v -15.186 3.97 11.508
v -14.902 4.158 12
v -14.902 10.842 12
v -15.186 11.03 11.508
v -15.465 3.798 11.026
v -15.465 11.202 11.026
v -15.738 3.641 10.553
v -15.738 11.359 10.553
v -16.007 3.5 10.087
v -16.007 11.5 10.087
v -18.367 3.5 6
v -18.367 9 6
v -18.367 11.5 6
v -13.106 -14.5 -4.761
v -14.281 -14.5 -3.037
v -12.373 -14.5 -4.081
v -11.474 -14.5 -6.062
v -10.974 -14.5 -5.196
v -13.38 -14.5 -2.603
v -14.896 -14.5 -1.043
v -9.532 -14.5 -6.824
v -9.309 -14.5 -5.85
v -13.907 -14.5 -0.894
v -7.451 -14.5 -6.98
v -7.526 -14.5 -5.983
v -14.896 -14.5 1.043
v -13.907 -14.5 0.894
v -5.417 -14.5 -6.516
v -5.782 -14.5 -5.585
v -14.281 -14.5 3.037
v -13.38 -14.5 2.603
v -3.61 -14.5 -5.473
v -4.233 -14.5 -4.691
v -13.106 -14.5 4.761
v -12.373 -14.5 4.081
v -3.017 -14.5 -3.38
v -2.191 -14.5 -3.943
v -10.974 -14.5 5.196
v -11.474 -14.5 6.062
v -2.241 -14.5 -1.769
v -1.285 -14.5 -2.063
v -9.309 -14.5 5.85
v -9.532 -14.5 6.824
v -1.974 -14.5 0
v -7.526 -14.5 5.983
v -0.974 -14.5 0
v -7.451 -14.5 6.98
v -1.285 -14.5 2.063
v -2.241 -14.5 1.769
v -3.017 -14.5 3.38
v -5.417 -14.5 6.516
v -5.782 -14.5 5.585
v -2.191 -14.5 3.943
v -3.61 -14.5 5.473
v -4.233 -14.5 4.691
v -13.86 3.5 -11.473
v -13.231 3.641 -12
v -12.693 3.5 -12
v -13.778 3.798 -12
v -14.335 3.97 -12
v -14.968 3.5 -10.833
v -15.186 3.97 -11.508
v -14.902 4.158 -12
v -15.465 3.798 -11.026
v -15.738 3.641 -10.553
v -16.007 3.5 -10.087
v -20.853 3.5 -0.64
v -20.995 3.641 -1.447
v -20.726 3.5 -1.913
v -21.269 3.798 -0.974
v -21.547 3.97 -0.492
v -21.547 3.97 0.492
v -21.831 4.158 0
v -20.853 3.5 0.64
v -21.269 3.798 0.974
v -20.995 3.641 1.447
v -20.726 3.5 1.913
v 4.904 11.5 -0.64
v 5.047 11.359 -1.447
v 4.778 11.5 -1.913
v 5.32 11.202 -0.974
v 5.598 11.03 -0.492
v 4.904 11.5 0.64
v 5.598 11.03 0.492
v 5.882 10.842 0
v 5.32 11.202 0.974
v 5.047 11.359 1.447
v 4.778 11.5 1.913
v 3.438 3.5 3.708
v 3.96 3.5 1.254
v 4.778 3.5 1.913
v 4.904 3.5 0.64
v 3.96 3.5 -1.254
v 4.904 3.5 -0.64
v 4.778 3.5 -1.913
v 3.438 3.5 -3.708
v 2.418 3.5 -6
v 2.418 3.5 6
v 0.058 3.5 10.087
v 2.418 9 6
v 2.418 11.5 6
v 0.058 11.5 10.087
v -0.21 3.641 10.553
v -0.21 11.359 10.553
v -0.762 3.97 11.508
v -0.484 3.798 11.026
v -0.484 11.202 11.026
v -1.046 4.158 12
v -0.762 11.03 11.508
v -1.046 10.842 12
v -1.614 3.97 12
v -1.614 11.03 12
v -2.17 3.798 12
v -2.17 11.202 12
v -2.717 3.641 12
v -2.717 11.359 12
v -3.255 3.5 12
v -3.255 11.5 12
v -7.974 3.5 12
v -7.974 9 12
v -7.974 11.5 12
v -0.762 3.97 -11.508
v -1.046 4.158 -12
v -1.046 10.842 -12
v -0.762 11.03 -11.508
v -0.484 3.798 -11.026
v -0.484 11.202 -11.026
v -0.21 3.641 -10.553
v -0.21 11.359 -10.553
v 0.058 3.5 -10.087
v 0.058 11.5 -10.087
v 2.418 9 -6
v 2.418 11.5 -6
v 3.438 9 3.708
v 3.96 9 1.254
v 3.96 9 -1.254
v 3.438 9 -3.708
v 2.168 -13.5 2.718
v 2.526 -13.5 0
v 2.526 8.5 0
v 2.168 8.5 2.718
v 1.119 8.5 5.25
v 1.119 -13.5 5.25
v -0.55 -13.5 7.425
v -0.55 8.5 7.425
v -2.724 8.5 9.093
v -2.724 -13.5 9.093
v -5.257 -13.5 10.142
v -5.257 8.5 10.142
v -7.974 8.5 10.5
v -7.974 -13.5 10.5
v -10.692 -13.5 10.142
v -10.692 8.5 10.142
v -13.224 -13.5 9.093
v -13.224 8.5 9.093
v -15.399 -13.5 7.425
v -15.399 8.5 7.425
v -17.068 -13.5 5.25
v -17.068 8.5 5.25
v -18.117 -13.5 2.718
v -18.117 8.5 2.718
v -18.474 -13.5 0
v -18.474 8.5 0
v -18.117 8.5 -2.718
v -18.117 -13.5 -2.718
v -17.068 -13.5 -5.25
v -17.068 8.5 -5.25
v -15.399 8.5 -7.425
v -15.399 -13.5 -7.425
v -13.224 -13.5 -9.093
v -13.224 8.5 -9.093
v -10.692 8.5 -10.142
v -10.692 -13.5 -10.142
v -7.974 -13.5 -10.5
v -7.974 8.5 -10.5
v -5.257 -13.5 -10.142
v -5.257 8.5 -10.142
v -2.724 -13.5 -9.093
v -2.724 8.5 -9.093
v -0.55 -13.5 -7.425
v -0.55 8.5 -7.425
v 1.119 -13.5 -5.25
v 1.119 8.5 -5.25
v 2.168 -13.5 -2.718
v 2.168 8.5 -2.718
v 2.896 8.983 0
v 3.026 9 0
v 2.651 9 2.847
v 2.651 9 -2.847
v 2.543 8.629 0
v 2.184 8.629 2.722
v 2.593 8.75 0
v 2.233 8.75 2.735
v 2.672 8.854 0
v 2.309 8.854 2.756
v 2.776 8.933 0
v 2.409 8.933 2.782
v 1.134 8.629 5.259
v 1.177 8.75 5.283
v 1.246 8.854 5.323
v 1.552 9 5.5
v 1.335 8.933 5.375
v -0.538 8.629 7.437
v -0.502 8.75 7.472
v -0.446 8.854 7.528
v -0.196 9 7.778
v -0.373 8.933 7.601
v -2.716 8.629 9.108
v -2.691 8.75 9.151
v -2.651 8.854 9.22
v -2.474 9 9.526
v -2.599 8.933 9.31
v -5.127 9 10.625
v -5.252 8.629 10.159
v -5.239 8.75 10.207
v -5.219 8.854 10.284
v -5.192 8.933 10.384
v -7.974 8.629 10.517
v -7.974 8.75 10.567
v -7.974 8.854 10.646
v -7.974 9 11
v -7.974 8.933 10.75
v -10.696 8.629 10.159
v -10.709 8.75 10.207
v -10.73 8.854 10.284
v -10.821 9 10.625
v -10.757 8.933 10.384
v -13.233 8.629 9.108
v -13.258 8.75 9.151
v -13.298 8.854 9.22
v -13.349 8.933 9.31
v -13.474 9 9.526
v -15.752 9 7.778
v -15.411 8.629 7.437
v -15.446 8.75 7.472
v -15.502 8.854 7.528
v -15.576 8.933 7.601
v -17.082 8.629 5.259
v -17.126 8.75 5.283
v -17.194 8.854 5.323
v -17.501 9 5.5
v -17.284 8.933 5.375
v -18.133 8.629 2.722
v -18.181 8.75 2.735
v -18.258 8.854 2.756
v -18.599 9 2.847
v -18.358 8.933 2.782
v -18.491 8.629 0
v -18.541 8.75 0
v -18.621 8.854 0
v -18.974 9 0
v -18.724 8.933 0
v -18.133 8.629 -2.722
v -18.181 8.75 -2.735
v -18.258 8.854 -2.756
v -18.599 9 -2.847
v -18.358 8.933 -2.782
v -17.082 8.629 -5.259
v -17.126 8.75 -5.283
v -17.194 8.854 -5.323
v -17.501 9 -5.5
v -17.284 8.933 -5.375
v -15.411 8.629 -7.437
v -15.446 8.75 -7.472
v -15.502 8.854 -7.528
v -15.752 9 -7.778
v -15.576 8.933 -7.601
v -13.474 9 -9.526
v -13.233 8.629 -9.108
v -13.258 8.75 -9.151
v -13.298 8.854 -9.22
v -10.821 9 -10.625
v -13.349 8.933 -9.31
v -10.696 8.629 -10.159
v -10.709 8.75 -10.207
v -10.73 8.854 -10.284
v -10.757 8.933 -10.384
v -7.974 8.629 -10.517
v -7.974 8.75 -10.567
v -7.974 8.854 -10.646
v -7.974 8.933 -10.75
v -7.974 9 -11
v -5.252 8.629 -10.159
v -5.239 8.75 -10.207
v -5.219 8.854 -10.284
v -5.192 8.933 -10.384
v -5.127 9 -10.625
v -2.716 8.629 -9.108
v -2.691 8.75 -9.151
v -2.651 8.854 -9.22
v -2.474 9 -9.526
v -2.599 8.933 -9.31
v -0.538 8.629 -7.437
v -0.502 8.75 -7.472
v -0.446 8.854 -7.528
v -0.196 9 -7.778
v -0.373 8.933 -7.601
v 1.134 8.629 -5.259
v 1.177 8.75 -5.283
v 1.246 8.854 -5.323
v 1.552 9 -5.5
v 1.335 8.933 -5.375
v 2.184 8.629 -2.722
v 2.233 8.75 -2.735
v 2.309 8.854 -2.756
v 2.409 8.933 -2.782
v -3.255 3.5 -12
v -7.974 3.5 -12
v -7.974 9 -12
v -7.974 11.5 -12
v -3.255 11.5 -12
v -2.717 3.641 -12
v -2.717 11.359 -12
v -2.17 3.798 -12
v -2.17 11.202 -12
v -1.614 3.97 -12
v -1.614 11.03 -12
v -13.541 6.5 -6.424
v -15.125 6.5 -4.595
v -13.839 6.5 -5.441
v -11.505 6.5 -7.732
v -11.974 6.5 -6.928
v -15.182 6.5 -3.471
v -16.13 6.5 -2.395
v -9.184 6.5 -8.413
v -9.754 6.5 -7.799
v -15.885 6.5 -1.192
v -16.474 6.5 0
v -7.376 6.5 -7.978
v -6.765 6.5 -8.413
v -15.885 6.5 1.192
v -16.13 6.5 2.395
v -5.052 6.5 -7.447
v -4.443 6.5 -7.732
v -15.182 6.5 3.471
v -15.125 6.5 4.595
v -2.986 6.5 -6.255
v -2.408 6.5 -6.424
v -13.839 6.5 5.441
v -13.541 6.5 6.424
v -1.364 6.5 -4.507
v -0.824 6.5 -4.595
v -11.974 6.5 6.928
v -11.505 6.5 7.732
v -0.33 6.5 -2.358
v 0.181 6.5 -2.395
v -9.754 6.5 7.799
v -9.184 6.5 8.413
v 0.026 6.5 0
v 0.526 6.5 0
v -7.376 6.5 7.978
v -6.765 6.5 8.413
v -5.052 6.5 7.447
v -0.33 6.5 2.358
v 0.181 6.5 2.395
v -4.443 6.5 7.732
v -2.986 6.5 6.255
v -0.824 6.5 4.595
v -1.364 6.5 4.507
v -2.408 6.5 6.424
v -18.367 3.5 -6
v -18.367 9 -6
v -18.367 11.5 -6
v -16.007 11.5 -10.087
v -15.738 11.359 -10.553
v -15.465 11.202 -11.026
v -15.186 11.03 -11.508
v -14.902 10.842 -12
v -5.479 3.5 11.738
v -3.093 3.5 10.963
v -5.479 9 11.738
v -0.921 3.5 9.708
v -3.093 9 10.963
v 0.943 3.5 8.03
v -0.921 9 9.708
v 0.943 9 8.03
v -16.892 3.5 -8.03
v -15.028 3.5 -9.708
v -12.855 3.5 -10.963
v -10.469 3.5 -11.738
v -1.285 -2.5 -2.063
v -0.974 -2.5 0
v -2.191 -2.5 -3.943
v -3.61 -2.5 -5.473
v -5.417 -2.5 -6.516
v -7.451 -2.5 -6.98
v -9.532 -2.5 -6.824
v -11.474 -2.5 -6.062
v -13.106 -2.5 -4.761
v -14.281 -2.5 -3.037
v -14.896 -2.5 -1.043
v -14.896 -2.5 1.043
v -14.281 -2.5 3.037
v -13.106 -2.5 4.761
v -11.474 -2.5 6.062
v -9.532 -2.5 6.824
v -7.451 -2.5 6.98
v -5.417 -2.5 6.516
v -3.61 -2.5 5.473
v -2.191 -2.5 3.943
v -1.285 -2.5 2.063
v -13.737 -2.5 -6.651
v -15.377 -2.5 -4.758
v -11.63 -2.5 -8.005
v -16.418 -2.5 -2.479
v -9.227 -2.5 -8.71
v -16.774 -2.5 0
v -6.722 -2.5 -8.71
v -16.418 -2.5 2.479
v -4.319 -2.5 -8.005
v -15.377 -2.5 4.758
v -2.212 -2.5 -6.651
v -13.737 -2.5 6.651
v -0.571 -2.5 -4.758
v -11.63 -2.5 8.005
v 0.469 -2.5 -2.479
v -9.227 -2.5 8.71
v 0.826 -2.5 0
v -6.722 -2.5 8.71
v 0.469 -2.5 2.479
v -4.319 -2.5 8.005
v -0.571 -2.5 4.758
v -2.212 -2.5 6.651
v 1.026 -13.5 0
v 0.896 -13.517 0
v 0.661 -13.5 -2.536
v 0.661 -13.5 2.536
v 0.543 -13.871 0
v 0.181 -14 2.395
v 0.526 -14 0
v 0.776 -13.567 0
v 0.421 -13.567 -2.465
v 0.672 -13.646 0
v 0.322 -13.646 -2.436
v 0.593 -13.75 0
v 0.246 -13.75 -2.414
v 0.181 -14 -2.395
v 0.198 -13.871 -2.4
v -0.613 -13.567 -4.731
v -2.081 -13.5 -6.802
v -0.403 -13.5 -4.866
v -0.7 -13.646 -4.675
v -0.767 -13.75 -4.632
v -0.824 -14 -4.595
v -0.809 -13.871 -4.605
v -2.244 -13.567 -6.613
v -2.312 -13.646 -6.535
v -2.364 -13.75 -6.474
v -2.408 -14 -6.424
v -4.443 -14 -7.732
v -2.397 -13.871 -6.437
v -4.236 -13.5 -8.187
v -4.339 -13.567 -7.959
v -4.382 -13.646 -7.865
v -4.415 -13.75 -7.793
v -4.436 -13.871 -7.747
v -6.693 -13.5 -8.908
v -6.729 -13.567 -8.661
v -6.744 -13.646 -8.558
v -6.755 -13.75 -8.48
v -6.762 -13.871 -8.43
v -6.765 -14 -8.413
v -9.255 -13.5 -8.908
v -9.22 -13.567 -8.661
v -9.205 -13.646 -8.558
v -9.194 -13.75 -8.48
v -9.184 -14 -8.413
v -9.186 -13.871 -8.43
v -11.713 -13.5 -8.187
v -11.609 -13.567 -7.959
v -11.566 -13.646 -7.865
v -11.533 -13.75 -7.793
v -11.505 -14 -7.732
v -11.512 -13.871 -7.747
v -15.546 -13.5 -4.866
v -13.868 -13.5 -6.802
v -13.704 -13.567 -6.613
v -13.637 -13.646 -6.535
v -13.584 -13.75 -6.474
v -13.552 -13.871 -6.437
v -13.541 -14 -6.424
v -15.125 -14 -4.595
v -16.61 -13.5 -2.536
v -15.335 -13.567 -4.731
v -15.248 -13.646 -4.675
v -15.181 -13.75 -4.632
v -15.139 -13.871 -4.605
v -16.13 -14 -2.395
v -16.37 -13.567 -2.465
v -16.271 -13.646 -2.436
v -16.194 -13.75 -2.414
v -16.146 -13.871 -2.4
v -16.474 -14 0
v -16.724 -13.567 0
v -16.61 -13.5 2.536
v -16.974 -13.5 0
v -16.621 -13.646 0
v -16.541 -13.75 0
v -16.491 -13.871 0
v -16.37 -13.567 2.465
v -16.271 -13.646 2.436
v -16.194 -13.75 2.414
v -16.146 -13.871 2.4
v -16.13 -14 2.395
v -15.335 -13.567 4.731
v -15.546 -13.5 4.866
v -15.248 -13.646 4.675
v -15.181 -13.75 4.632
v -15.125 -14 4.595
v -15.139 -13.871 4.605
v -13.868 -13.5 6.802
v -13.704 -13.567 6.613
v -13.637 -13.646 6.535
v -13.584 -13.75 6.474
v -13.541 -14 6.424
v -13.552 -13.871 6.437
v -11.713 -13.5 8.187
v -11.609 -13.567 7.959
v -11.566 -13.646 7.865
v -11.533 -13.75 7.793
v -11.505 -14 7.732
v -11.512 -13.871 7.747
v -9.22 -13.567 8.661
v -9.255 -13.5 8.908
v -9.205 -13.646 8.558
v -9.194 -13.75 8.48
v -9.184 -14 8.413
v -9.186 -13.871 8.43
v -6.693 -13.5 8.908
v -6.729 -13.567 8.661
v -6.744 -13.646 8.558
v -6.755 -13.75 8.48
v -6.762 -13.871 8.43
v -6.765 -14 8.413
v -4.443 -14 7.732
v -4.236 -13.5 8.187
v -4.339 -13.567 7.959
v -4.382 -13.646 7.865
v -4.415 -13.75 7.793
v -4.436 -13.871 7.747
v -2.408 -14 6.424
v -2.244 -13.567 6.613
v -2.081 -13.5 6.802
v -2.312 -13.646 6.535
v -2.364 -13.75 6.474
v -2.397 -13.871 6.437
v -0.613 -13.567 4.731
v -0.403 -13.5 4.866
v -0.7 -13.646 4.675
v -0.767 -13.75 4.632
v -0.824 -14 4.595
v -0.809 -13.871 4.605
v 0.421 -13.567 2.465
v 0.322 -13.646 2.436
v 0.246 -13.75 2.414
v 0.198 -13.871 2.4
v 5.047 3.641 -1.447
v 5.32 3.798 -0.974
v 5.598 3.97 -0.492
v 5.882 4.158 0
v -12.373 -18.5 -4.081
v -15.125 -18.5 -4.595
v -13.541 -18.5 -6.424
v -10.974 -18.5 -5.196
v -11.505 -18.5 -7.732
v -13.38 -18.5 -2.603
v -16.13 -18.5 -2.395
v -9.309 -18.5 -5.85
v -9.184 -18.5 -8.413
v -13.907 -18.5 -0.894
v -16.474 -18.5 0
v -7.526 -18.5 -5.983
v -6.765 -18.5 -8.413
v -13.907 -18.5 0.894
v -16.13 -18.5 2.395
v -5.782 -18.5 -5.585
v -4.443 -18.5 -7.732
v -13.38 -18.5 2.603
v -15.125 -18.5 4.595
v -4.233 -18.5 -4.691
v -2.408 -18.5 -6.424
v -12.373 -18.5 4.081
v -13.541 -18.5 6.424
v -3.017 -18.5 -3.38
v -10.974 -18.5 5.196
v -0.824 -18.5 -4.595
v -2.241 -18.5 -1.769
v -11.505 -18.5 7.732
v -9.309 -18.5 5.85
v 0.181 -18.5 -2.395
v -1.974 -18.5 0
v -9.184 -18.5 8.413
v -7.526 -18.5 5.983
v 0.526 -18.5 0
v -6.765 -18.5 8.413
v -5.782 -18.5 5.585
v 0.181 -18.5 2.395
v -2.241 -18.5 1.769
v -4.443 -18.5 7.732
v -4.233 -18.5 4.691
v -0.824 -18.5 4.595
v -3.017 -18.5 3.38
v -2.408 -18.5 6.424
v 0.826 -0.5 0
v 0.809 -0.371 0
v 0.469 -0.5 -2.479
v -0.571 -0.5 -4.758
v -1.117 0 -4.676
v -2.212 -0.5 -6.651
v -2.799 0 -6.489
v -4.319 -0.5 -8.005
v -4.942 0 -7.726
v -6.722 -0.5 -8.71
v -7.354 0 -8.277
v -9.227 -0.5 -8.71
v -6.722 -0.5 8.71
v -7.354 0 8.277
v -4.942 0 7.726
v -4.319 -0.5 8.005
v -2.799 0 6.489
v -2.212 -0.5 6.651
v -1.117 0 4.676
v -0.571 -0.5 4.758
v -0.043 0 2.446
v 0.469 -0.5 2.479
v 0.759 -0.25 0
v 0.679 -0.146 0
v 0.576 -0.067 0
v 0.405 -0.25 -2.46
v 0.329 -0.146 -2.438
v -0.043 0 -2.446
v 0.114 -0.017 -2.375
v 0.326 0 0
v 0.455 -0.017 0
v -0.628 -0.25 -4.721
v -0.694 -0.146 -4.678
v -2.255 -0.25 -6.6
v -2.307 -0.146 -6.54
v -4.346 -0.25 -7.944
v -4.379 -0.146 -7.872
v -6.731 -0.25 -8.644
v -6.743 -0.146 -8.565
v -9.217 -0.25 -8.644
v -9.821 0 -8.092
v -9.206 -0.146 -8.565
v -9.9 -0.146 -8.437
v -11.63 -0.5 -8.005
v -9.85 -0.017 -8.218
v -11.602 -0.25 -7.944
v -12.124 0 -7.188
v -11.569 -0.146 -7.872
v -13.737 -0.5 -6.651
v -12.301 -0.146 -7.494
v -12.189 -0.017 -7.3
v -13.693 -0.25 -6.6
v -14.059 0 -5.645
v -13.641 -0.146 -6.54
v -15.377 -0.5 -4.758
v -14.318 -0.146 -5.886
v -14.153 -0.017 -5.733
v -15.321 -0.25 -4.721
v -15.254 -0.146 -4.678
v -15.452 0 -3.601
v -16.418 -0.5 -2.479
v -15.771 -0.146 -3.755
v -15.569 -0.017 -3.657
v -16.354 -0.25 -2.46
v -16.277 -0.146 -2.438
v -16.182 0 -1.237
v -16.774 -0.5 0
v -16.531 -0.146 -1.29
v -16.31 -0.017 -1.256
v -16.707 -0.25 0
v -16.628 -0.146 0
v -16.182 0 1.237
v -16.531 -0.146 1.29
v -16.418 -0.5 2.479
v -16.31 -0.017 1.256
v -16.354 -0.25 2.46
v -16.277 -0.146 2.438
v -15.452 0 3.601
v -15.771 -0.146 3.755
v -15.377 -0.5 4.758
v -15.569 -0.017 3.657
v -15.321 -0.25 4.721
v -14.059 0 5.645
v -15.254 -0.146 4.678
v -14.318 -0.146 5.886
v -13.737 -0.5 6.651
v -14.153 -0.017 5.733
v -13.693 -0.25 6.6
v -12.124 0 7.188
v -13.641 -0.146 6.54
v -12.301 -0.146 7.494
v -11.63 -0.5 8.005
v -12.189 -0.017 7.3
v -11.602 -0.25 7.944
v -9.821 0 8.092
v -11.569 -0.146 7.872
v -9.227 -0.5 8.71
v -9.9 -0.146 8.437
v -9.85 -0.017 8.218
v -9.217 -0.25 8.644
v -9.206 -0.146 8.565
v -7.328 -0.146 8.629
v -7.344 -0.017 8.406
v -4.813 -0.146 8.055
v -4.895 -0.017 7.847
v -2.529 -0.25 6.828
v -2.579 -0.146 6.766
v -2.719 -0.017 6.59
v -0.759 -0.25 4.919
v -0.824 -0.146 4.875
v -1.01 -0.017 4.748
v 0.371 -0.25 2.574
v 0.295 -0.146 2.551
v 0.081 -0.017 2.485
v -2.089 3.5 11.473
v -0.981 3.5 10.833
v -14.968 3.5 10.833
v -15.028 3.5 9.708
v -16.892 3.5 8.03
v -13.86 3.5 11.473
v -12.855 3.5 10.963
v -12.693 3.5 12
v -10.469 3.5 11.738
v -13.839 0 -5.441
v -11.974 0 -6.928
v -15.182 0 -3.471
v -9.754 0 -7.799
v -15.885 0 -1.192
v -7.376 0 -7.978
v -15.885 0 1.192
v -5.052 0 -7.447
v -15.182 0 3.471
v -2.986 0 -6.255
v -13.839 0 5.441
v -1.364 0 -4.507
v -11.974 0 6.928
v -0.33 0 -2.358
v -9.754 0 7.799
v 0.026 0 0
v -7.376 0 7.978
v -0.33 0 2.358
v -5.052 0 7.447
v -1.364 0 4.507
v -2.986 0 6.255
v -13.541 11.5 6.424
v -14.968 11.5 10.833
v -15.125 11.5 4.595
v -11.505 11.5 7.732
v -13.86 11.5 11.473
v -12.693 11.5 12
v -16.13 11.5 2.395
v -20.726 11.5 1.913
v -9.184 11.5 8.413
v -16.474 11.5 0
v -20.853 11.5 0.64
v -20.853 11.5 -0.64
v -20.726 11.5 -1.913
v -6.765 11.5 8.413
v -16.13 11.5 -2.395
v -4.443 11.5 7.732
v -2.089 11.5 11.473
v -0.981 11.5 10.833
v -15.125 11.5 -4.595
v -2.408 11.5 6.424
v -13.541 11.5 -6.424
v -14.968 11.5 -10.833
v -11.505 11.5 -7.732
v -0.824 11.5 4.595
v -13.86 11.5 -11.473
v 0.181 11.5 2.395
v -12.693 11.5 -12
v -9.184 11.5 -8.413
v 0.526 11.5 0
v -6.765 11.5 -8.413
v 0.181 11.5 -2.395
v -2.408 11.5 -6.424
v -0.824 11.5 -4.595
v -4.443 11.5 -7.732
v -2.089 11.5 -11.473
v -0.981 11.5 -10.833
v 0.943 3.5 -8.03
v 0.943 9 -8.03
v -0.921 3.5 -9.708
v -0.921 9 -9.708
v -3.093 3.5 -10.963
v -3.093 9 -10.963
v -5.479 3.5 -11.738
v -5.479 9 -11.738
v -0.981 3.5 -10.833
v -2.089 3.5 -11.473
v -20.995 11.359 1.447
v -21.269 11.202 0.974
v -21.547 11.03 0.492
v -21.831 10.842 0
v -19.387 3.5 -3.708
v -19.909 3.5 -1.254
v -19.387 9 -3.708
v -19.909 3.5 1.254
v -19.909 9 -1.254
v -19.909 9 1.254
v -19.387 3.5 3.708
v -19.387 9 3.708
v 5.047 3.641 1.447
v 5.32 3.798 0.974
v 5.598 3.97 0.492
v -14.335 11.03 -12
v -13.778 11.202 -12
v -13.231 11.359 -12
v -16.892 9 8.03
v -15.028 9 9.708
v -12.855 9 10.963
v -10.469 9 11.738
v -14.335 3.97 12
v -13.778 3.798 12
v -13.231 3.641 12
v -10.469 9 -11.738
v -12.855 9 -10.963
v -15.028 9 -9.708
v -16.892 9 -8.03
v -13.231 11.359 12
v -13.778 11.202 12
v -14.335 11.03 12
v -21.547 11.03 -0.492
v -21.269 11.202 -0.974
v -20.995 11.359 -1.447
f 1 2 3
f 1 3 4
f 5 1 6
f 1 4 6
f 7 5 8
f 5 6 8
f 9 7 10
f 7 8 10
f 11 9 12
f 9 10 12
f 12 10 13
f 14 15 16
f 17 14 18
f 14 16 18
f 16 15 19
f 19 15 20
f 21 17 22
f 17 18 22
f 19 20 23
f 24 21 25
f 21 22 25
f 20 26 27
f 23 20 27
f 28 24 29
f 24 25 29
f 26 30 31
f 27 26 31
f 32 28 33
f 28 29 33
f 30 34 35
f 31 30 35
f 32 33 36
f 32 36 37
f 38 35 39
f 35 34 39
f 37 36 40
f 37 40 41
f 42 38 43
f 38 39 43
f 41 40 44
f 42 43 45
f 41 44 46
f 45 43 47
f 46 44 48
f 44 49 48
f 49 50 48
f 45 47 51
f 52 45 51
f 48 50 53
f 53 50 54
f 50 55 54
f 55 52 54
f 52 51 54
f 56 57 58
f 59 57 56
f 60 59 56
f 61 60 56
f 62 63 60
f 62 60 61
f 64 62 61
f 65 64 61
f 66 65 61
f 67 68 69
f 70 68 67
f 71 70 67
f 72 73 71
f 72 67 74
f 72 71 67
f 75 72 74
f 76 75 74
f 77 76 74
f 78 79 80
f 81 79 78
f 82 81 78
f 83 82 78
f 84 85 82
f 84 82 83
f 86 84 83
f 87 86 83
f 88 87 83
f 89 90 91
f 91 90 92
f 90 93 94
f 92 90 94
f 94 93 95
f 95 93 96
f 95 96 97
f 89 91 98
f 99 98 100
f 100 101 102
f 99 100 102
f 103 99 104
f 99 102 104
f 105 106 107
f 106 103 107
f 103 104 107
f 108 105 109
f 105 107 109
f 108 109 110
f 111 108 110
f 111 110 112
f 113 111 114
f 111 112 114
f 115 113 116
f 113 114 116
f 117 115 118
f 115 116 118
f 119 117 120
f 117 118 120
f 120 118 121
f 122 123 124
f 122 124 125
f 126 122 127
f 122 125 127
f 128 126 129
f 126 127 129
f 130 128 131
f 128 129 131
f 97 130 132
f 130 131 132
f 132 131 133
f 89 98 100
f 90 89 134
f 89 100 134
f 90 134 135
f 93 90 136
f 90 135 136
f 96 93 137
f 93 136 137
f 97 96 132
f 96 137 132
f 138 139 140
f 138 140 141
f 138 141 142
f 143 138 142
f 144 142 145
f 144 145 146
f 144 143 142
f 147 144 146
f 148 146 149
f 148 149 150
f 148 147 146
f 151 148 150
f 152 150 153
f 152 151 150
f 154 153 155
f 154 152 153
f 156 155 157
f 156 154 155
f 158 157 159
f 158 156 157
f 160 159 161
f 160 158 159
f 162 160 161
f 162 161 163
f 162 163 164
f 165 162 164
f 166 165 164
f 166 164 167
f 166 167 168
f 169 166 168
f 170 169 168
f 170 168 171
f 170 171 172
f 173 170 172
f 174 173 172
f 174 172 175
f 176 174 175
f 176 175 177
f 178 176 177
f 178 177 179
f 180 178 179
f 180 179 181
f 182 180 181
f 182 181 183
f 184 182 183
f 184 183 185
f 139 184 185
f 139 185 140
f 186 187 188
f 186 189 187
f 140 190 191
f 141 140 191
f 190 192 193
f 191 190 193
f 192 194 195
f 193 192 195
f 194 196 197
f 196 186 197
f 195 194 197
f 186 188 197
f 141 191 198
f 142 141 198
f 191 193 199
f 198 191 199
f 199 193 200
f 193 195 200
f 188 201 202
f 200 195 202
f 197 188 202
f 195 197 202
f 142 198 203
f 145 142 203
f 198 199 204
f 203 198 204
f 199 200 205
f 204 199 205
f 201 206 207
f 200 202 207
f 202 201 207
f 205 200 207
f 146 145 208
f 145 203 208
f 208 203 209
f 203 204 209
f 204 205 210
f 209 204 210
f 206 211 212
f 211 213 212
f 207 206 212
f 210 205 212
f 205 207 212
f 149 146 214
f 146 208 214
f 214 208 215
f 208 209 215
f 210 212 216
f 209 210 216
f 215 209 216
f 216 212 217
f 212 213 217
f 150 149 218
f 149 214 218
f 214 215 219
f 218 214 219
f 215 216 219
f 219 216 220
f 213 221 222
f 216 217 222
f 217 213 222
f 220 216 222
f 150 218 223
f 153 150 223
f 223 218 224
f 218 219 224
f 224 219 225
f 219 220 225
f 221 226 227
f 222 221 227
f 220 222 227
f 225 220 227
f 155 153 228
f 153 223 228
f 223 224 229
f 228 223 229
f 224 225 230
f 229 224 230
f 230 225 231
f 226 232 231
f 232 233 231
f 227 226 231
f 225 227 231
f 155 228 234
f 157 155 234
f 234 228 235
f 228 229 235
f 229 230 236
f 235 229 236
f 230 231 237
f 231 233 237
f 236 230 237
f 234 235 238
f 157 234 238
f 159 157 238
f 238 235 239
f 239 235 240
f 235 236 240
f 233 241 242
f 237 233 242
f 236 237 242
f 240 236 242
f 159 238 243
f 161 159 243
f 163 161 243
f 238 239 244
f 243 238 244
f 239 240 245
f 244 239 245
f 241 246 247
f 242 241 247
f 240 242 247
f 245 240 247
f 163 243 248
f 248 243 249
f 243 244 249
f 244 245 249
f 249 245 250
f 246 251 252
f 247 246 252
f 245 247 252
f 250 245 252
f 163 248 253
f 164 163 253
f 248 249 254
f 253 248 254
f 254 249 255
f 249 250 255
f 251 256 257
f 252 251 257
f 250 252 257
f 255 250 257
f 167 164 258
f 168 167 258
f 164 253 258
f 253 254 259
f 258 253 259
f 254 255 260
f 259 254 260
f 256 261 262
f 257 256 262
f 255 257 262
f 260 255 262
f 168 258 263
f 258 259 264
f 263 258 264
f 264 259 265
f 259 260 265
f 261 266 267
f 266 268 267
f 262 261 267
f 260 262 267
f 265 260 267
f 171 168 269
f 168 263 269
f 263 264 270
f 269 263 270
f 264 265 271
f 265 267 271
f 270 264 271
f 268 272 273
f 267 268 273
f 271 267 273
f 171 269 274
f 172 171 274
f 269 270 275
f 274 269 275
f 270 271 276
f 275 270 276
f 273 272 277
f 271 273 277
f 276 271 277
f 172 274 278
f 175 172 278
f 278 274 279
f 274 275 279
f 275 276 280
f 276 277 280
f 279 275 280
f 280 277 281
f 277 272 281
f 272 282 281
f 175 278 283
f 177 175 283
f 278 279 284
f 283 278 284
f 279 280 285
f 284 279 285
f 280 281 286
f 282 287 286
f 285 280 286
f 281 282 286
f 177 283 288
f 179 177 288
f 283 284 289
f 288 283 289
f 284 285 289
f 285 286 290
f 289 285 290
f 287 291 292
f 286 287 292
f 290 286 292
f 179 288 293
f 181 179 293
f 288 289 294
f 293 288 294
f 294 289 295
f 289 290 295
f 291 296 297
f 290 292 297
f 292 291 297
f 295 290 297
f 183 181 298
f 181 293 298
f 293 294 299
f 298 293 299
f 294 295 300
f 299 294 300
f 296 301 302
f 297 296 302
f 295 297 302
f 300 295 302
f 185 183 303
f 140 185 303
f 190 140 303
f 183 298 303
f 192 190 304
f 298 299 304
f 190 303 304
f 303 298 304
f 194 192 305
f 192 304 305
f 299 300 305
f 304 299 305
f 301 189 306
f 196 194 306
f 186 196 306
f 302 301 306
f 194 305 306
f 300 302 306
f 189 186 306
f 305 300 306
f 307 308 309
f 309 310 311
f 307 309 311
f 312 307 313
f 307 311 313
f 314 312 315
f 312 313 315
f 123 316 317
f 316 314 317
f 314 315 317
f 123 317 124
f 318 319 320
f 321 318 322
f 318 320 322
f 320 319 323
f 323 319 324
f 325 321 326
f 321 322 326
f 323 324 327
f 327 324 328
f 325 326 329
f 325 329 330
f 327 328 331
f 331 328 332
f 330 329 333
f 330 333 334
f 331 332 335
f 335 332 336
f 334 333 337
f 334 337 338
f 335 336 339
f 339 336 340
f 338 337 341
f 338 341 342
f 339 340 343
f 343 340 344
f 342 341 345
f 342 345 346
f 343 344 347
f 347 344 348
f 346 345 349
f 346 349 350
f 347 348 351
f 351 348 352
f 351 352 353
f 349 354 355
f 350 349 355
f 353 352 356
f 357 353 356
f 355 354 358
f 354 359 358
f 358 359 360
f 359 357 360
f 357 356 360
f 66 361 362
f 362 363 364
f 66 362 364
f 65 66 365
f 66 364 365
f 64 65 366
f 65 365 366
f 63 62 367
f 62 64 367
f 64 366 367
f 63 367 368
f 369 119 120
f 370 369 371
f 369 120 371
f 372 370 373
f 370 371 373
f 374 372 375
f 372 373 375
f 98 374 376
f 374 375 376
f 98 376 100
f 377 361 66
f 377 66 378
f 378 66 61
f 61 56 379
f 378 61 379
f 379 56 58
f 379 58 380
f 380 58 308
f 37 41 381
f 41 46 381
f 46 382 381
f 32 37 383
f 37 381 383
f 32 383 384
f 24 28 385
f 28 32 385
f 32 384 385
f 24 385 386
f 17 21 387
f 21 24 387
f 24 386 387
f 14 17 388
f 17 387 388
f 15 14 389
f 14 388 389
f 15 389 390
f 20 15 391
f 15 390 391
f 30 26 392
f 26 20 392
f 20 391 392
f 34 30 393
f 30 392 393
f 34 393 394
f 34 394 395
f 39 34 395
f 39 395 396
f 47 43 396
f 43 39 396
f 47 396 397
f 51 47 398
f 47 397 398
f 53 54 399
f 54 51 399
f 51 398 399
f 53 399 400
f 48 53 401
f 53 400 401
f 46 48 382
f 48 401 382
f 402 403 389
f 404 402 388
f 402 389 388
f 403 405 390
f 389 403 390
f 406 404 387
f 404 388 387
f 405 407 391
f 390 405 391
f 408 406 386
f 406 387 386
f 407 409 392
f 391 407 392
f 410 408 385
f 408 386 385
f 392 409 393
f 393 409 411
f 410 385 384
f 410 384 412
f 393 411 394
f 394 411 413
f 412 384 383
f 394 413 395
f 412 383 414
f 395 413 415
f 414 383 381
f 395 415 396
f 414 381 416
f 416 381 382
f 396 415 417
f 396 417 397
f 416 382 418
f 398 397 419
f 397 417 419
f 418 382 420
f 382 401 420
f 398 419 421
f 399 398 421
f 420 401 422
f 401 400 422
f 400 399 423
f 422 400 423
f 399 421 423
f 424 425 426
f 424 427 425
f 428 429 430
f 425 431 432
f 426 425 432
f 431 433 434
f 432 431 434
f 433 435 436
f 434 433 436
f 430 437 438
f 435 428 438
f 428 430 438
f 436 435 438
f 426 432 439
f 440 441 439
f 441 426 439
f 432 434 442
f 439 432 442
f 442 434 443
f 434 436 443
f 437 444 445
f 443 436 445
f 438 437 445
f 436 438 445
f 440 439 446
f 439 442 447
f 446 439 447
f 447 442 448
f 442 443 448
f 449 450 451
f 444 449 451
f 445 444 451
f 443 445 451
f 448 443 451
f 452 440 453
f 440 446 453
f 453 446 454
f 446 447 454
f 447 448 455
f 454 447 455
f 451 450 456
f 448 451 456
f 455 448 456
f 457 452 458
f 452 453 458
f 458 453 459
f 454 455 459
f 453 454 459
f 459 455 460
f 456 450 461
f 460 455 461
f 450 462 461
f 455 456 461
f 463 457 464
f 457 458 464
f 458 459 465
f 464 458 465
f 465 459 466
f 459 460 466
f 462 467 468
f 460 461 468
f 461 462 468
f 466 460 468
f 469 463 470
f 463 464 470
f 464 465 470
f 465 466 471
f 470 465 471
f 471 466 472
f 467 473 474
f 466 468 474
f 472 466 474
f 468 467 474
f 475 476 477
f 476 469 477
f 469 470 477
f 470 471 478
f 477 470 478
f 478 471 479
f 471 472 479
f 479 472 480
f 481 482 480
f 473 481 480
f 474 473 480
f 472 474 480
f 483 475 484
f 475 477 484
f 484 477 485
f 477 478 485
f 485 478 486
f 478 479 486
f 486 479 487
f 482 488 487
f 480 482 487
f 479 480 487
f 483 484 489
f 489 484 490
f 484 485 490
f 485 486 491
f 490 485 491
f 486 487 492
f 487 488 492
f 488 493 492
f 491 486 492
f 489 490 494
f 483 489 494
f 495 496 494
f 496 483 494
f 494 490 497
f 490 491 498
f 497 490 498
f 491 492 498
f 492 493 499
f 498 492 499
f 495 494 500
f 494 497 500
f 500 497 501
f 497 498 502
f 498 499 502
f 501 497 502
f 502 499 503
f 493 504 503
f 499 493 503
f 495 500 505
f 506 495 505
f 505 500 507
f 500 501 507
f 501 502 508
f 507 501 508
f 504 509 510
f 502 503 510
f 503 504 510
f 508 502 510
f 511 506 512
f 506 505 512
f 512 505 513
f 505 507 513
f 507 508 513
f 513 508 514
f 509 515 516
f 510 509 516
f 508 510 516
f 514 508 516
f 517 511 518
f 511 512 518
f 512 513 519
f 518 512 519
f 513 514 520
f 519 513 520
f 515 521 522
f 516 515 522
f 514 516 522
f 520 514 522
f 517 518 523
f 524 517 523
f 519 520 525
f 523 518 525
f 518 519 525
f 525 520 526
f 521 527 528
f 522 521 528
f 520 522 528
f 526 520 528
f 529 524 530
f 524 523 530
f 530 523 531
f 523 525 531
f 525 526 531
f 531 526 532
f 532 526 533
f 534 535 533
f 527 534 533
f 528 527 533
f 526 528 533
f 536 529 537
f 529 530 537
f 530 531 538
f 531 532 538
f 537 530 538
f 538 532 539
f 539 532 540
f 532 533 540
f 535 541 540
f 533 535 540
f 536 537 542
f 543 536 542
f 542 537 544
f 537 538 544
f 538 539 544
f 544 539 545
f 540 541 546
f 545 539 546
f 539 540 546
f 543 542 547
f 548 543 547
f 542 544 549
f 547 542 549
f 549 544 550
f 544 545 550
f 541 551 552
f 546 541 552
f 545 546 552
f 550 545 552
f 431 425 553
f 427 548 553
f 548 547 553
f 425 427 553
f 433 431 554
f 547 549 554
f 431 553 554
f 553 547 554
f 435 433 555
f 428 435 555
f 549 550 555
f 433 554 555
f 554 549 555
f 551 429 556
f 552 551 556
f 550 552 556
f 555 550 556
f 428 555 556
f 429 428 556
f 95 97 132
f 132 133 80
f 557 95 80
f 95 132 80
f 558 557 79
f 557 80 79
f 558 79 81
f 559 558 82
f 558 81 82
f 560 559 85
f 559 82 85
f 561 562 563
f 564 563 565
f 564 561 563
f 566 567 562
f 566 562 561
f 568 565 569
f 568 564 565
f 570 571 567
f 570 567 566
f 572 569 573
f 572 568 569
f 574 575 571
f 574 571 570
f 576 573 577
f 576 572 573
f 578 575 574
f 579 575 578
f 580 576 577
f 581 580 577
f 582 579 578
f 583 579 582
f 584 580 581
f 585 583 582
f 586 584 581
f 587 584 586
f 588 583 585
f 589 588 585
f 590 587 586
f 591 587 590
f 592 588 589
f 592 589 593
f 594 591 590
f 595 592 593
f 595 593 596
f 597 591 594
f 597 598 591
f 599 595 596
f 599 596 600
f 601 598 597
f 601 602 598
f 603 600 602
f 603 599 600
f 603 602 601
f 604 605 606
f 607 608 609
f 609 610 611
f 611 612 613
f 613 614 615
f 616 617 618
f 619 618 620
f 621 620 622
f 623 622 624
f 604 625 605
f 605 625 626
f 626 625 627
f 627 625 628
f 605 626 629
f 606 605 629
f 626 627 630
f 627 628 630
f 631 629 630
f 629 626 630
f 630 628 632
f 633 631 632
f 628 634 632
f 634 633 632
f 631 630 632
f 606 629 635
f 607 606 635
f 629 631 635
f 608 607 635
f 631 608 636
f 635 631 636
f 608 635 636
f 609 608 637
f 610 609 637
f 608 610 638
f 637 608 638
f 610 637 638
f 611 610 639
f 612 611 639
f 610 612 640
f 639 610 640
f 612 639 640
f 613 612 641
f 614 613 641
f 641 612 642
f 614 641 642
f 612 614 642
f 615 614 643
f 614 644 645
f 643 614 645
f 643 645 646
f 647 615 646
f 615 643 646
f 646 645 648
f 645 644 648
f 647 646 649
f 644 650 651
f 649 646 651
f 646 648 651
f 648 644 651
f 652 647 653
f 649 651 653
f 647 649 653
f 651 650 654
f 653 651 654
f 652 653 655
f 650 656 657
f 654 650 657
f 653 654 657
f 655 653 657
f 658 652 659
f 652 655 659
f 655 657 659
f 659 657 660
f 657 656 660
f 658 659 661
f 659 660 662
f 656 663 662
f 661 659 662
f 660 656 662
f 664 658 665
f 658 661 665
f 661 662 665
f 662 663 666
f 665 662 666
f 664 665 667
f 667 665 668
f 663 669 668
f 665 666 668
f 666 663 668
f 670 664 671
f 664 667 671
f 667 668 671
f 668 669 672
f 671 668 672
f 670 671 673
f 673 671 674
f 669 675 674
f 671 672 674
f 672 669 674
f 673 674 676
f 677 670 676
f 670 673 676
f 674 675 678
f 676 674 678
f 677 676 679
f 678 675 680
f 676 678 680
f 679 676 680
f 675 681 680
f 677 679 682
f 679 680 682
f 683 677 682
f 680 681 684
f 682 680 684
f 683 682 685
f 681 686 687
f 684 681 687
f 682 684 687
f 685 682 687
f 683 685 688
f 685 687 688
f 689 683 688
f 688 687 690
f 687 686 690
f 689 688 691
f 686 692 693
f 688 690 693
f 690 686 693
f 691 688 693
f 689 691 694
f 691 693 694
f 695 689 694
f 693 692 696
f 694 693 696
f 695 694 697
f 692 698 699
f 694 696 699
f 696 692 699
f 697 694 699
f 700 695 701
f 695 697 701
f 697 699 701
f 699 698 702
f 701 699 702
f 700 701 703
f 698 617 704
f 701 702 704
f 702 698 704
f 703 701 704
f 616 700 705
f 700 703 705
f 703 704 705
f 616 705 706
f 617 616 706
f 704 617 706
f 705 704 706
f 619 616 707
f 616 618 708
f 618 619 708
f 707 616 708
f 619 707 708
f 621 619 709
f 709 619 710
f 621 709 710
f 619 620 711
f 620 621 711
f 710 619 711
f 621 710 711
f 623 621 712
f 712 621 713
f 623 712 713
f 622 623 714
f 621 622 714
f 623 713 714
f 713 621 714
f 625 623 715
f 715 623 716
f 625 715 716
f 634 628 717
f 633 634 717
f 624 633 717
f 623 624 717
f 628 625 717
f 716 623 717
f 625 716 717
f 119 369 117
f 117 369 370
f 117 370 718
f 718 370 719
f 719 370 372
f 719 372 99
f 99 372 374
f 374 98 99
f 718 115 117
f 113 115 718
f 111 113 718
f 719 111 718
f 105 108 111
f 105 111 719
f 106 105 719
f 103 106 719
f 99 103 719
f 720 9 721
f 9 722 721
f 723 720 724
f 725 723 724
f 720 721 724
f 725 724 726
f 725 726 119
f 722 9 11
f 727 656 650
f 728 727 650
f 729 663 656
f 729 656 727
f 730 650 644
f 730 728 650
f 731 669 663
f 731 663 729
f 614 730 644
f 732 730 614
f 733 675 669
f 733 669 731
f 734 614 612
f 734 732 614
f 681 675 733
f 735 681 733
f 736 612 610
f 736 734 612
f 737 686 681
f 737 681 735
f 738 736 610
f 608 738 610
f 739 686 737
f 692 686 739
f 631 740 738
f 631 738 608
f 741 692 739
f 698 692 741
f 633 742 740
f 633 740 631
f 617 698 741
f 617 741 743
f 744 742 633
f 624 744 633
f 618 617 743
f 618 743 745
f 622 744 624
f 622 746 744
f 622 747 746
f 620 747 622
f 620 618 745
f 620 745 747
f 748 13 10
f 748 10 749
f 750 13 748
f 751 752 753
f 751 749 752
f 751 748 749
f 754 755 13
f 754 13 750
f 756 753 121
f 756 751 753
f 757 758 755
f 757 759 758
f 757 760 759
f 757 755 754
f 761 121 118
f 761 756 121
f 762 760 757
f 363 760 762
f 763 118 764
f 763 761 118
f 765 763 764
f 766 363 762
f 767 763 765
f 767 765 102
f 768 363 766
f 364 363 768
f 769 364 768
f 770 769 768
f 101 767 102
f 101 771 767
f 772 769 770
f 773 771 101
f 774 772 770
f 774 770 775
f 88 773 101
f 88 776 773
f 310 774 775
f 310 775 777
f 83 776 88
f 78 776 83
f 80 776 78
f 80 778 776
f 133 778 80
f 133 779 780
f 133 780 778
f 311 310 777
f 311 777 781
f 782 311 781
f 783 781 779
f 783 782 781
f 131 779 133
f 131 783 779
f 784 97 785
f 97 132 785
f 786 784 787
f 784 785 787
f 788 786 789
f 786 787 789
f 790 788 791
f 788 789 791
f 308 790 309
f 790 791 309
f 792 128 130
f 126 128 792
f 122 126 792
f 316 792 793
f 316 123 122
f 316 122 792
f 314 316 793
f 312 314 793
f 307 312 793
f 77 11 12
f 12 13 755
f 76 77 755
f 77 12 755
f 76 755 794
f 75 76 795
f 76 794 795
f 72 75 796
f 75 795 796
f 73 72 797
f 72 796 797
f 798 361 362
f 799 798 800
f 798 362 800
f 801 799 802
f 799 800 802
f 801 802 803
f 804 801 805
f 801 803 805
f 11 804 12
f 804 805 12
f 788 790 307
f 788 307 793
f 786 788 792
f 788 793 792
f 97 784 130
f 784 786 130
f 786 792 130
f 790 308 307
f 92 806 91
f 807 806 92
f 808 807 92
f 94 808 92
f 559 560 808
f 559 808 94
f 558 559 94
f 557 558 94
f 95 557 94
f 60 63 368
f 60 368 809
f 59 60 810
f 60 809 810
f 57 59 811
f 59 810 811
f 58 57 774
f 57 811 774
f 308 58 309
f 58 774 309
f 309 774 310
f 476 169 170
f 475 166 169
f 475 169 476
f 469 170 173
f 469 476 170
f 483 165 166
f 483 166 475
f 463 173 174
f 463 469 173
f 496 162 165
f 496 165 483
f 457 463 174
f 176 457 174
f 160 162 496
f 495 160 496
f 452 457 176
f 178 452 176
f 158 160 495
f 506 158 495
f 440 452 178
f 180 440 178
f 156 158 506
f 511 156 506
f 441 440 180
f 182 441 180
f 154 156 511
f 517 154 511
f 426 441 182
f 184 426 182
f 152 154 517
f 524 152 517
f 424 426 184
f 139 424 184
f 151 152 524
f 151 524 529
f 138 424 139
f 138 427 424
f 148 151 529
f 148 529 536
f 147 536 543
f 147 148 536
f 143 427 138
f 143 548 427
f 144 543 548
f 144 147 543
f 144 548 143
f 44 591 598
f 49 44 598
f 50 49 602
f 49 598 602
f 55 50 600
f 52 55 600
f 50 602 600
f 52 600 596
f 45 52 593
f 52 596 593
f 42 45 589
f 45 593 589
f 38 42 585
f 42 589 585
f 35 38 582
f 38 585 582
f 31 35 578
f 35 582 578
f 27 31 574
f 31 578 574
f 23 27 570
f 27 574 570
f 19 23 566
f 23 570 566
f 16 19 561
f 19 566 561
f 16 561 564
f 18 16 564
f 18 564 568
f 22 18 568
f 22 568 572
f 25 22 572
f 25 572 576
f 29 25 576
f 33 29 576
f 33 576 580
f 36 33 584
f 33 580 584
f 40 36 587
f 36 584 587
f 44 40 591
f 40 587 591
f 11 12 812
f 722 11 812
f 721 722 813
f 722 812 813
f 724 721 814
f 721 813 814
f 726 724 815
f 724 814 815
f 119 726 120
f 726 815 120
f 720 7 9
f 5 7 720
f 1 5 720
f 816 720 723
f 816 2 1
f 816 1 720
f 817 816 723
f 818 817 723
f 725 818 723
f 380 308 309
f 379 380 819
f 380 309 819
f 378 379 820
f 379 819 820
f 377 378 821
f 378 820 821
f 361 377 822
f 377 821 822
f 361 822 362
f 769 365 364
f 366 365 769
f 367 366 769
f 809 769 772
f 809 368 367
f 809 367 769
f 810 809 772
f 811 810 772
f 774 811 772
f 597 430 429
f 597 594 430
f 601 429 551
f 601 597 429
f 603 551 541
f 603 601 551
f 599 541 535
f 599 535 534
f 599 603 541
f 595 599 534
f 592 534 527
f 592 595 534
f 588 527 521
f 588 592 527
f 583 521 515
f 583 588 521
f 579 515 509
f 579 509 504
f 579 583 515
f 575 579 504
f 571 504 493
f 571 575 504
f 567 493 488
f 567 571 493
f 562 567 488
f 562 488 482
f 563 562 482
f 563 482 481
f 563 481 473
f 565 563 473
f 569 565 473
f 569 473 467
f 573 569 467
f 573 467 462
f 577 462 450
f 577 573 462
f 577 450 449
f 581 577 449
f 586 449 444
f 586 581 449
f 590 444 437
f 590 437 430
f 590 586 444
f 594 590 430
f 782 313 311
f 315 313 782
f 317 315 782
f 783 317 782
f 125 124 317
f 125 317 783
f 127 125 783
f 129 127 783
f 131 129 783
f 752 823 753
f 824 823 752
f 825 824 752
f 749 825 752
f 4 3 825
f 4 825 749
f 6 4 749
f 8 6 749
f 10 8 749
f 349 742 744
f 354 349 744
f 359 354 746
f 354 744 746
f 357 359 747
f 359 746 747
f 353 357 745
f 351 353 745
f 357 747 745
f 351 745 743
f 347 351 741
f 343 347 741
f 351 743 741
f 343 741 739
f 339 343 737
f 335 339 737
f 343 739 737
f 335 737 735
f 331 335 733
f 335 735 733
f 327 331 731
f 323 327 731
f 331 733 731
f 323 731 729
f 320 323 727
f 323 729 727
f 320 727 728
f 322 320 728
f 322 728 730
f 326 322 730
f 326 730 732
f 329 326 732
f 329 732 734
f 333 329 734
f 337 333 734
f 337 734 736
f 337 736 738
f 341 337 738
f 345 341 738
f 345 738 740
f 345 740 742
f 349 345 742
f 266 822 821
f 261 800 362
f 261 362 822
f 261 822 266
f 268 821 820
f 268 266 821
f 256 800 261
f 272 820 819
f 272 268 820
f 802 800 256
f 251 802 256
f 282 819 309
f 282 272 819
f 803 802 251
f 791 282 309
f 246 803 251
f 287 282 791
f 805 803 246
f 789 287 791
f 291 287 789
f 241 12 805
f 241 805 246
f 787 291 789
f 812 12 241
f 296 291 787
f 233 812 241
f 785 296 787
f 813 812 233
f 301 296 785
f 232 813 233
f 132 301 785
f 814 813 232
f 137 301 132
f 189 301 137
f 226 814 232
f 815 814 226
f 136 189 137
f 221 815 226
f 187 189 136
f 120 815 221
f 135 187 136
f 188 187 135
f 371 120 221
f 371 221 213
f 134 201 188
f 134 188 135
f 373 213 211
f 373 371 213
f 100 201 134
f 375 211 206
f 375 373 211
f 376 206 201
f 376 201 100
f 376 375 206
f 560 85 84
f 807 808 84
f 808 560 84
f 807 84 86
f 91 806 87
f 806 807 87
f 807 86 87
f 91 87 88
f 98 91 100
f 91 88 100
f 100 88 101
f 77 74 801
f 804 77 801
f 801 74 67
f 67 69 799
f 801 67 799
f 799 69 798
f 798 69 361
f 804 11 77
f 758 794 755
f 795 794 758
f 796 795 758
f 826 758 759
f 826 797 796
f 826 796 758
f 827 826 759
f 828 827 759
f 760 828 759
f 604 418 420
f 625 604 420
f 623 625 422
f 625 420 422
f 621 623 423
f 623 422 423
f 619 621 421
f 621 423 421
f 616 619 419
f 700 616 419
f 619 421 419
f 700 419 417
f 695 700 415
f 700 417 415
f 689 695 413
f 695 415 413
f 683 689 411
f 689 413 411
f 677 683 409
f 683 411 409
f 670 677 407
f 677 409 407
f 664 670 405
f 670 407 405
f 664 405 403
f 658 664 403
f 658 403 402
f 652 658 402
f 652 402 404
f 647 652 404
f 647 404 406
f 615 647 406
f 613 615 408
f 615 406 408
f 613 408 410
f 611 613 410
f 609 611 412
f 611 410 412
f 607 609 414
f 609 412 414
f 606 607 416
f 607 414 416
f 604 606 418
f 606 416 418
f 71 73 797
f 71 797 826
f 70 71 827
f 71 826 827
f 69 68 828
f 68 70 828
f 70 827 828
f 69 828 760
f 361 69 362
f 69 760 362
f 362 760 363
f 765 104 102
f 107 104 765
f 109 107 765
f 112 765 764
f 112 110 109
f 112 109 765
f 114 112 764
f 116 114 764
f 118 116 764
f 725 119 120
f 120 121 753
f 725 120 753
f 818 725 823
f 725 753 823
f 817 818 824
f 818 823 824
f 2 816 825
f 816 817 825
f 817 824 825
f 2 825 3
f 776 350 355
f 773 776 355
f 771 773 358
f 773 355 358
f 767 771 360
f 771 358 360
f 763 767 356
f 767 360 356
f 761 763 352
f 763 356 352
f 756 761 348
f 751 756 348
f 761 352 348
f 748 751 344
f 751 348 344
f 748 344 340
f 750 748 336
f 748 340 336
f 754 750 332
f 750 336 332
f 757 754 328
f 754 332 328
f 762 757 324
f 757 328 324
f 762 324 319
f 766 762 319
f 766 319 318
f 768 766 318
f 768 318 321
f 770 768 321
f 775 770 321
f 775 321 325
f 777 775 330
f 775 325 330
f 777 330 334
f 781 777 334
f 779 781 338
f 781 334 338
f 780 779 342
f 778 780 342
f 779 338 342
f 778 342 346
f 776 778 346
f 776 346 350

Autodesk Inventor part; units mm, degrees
ref_plane "YZ Plane" through (0, 0, 0) normal (1, 0, 0) x (0, 1, 0)
ref_plane "XZ Plane" through (0, 0, 0) normal (0, 1, 0) x (-1, 0, 0)
sketch "Sketch1" plane through (0, 0, 0) normal (0, 0, 1) x (1, 0, 0)
  line L0 (-7.9743, 17.1273) -> (-7.9743, -10.9738)
  line L1 (4.0257, 11.5) -> (4.0257, 9)
  line L2 (4.0257, 9) -> (2.5257, 9)
  line L3 (2.5257, 9) -> (2.5257, -13.5)
  line L4 (2.5257, -13.5) -> (0.5257, -13.5)
  line L5 (0.5257, -13.5) -> (0.5257, -18.5)
  line L6 (4.0257, 11.5) -> (0.5257, 11.5)
  line L7 (0.5257, 11.5) -> (0.5257, 6.5)
  line L8 (0.5257, -2.5) -> (-0.9743, -2.5)
  line L9 (-0.9743, -2.5) -> (-0.9743, -11.3304)
  line L10 (-1.9743, -14.5) -> (-1.9743, -18.5)
  line L11 (-1.9743, -18.5) -> (0.5257, -18.5)
  line L12 (-1.9743, -14.5) -> (-0.9743, -14.5)
  line L13 (-0.9743, -14.5) -> (-0.9743, -11.3304)
  line L14 (0.0257, 6.5) -> (0.0257, 0)
  line L15 (0.5257, 6.5) -> (0.0257, 6.5)
  line L16 (0.0257, 0) -> (0.3257, 0)
  line L17 (0.8257, -0.5) -> (0.8257, -2.5)
  line L18 (0.8257, -2.5) -> (0.5257, -2.5)
  arc A0 (0.8257, -0.5) -> (0.3257, 0) centre (0.3257, -0.5) ccw
  point P0 (0.8257, 0)
  dimension "d6" = 14
  dimension "d7" = 17
  dimension "d8" = 21
  dimension "d10" = 5
  dimension "d11" = 12
  dimension "d12" = 4
  dimension "d13" = 30
  dimension "d14" = 5
  dimension "d18" = 24
  dimension "d19" = 16
  dimension "d20" = 17
  dimension "d21" = 0.8
  dimension "d22" = 2.5
  dimension "d23" = 0.5
revolve "Revolution1" add sketch "Sketch1" angle 360 about axis through (-7.9743, 17.1273, 0) along (0, -1, 0)
sketch "Sketch2" plane through (-7.9743, 11.5, 0) normal (0, 1, 0) x (1, 0, 0)
  circle A0 centre (0, 0) radius 12 projected
  line L0 (6.9282, 12) -> (13.8564, 0)
  line L1 (13.8564, 0) -> (6.9282, -12)
  line L2 (6.9282, -12) -> (-6.9282, -12)
  line L3 (-6.9282, -12) -> (-13.8564, 0)
  line L4 (-13.8564, 0) -> (-6.9282, 12)
  line L5 (-6.9282, 12) -> (6.9282, 12)
  point P0 (7.9743, 0)
  point P1 (0, 12)
extrude "Extrusion1" add sketch "Sketch2" against normal blind 8 contours A0 L0 L1 | A0 L5 L0 | L1 L2 A0 | A0 L4 L5 | L2 L3 A0 | A0 L3 L4
sketch "Sketch3" plane through (0, 0, 0) normal (0, 0, 1) x (1, 0, 0)
  line L0 (2.418, 3.5) -> (5.8821, 3.5) projected
  line L1 (-1.0461, 11.5) -> (-1.0461, 3.5) projected
  line L2 (-1.0461, 11.5) -> (5.8821, 11.5) projected
  line L3 (5.8821, 11.5) -> (5.8821, 3.5) projected
  line L4 (-21.8307, 3.5) -> (-18.3666, 3.5) projected
  line L5 (-21.8307, 11.5) -> (-21.8307, 3.5) projected
  line L6 (-21.8307, 11.5) -> (-14.9025, 11.5) projected
  line L7 (-14.9025, 11.5) -> (-14.9025, 3.5) projected
  line L8 (-7.9743, 20.7963) -> (-7.9743, 13.4843)
  line L9 (6.3821, 12) -> (4.1894, 12)
  line L10 (6.3821, 12) -> (6.3821, 10.5)
  line L11 (4.1894, 12) -> (6.3821, 10.5)
  line L12 (-18.3666, 9) -> (-18.3666, 3.5) projected
  line L13 (-18.3666, 3.5) -> (-14.9025, 3.5) projected
  line L14 (2.418, 9) -> (2.418, 3.5) projected
  line L15 (-1.0461, 3.5) -> (2.418, 3.5) projected
  point P0 (0, 0)
  dimension "d36" = 0.5
  dimension "d38" = 0.5
  dimension "d39" = 1.5
revolve "Revolution2" cut sketch "Sketch3" angle 360 about axis through (-7.9743, 20.7963, 0) along (0, -1, 0) contours L11 L2 L3 | L3 L2 L11 L9 L10
sketch "Sketch5" plane through (0, 0, 0) normal (0, 0, 1) x (1, 0, 0)
  point P0 (0, 0)
ref_plane "Work Plane2" through (-12.6935, 7.5, -12) normal (0, 1, 0) x (1, 0, 0)
mirror "Mirror2" about plane through (-12.6935, 7.5, -12) normal (0, 1, 0) of "Revolution2"
thread "Thread1" size "M16x0.75" class "6H" standard "ANSI Metric M Profile" length 9
thread "Thread2" size "M22x1.5" class "6g" standard "ANSI Metric M Profile" full length
fillet "Fillet1" radius 0.5 1 edges at (-16.4743, -13.5, 0)
fillet "Fillet2" radius 0.5 1 edges at (-18.4743, 9, 0)
properties part number "MUSAB2"
